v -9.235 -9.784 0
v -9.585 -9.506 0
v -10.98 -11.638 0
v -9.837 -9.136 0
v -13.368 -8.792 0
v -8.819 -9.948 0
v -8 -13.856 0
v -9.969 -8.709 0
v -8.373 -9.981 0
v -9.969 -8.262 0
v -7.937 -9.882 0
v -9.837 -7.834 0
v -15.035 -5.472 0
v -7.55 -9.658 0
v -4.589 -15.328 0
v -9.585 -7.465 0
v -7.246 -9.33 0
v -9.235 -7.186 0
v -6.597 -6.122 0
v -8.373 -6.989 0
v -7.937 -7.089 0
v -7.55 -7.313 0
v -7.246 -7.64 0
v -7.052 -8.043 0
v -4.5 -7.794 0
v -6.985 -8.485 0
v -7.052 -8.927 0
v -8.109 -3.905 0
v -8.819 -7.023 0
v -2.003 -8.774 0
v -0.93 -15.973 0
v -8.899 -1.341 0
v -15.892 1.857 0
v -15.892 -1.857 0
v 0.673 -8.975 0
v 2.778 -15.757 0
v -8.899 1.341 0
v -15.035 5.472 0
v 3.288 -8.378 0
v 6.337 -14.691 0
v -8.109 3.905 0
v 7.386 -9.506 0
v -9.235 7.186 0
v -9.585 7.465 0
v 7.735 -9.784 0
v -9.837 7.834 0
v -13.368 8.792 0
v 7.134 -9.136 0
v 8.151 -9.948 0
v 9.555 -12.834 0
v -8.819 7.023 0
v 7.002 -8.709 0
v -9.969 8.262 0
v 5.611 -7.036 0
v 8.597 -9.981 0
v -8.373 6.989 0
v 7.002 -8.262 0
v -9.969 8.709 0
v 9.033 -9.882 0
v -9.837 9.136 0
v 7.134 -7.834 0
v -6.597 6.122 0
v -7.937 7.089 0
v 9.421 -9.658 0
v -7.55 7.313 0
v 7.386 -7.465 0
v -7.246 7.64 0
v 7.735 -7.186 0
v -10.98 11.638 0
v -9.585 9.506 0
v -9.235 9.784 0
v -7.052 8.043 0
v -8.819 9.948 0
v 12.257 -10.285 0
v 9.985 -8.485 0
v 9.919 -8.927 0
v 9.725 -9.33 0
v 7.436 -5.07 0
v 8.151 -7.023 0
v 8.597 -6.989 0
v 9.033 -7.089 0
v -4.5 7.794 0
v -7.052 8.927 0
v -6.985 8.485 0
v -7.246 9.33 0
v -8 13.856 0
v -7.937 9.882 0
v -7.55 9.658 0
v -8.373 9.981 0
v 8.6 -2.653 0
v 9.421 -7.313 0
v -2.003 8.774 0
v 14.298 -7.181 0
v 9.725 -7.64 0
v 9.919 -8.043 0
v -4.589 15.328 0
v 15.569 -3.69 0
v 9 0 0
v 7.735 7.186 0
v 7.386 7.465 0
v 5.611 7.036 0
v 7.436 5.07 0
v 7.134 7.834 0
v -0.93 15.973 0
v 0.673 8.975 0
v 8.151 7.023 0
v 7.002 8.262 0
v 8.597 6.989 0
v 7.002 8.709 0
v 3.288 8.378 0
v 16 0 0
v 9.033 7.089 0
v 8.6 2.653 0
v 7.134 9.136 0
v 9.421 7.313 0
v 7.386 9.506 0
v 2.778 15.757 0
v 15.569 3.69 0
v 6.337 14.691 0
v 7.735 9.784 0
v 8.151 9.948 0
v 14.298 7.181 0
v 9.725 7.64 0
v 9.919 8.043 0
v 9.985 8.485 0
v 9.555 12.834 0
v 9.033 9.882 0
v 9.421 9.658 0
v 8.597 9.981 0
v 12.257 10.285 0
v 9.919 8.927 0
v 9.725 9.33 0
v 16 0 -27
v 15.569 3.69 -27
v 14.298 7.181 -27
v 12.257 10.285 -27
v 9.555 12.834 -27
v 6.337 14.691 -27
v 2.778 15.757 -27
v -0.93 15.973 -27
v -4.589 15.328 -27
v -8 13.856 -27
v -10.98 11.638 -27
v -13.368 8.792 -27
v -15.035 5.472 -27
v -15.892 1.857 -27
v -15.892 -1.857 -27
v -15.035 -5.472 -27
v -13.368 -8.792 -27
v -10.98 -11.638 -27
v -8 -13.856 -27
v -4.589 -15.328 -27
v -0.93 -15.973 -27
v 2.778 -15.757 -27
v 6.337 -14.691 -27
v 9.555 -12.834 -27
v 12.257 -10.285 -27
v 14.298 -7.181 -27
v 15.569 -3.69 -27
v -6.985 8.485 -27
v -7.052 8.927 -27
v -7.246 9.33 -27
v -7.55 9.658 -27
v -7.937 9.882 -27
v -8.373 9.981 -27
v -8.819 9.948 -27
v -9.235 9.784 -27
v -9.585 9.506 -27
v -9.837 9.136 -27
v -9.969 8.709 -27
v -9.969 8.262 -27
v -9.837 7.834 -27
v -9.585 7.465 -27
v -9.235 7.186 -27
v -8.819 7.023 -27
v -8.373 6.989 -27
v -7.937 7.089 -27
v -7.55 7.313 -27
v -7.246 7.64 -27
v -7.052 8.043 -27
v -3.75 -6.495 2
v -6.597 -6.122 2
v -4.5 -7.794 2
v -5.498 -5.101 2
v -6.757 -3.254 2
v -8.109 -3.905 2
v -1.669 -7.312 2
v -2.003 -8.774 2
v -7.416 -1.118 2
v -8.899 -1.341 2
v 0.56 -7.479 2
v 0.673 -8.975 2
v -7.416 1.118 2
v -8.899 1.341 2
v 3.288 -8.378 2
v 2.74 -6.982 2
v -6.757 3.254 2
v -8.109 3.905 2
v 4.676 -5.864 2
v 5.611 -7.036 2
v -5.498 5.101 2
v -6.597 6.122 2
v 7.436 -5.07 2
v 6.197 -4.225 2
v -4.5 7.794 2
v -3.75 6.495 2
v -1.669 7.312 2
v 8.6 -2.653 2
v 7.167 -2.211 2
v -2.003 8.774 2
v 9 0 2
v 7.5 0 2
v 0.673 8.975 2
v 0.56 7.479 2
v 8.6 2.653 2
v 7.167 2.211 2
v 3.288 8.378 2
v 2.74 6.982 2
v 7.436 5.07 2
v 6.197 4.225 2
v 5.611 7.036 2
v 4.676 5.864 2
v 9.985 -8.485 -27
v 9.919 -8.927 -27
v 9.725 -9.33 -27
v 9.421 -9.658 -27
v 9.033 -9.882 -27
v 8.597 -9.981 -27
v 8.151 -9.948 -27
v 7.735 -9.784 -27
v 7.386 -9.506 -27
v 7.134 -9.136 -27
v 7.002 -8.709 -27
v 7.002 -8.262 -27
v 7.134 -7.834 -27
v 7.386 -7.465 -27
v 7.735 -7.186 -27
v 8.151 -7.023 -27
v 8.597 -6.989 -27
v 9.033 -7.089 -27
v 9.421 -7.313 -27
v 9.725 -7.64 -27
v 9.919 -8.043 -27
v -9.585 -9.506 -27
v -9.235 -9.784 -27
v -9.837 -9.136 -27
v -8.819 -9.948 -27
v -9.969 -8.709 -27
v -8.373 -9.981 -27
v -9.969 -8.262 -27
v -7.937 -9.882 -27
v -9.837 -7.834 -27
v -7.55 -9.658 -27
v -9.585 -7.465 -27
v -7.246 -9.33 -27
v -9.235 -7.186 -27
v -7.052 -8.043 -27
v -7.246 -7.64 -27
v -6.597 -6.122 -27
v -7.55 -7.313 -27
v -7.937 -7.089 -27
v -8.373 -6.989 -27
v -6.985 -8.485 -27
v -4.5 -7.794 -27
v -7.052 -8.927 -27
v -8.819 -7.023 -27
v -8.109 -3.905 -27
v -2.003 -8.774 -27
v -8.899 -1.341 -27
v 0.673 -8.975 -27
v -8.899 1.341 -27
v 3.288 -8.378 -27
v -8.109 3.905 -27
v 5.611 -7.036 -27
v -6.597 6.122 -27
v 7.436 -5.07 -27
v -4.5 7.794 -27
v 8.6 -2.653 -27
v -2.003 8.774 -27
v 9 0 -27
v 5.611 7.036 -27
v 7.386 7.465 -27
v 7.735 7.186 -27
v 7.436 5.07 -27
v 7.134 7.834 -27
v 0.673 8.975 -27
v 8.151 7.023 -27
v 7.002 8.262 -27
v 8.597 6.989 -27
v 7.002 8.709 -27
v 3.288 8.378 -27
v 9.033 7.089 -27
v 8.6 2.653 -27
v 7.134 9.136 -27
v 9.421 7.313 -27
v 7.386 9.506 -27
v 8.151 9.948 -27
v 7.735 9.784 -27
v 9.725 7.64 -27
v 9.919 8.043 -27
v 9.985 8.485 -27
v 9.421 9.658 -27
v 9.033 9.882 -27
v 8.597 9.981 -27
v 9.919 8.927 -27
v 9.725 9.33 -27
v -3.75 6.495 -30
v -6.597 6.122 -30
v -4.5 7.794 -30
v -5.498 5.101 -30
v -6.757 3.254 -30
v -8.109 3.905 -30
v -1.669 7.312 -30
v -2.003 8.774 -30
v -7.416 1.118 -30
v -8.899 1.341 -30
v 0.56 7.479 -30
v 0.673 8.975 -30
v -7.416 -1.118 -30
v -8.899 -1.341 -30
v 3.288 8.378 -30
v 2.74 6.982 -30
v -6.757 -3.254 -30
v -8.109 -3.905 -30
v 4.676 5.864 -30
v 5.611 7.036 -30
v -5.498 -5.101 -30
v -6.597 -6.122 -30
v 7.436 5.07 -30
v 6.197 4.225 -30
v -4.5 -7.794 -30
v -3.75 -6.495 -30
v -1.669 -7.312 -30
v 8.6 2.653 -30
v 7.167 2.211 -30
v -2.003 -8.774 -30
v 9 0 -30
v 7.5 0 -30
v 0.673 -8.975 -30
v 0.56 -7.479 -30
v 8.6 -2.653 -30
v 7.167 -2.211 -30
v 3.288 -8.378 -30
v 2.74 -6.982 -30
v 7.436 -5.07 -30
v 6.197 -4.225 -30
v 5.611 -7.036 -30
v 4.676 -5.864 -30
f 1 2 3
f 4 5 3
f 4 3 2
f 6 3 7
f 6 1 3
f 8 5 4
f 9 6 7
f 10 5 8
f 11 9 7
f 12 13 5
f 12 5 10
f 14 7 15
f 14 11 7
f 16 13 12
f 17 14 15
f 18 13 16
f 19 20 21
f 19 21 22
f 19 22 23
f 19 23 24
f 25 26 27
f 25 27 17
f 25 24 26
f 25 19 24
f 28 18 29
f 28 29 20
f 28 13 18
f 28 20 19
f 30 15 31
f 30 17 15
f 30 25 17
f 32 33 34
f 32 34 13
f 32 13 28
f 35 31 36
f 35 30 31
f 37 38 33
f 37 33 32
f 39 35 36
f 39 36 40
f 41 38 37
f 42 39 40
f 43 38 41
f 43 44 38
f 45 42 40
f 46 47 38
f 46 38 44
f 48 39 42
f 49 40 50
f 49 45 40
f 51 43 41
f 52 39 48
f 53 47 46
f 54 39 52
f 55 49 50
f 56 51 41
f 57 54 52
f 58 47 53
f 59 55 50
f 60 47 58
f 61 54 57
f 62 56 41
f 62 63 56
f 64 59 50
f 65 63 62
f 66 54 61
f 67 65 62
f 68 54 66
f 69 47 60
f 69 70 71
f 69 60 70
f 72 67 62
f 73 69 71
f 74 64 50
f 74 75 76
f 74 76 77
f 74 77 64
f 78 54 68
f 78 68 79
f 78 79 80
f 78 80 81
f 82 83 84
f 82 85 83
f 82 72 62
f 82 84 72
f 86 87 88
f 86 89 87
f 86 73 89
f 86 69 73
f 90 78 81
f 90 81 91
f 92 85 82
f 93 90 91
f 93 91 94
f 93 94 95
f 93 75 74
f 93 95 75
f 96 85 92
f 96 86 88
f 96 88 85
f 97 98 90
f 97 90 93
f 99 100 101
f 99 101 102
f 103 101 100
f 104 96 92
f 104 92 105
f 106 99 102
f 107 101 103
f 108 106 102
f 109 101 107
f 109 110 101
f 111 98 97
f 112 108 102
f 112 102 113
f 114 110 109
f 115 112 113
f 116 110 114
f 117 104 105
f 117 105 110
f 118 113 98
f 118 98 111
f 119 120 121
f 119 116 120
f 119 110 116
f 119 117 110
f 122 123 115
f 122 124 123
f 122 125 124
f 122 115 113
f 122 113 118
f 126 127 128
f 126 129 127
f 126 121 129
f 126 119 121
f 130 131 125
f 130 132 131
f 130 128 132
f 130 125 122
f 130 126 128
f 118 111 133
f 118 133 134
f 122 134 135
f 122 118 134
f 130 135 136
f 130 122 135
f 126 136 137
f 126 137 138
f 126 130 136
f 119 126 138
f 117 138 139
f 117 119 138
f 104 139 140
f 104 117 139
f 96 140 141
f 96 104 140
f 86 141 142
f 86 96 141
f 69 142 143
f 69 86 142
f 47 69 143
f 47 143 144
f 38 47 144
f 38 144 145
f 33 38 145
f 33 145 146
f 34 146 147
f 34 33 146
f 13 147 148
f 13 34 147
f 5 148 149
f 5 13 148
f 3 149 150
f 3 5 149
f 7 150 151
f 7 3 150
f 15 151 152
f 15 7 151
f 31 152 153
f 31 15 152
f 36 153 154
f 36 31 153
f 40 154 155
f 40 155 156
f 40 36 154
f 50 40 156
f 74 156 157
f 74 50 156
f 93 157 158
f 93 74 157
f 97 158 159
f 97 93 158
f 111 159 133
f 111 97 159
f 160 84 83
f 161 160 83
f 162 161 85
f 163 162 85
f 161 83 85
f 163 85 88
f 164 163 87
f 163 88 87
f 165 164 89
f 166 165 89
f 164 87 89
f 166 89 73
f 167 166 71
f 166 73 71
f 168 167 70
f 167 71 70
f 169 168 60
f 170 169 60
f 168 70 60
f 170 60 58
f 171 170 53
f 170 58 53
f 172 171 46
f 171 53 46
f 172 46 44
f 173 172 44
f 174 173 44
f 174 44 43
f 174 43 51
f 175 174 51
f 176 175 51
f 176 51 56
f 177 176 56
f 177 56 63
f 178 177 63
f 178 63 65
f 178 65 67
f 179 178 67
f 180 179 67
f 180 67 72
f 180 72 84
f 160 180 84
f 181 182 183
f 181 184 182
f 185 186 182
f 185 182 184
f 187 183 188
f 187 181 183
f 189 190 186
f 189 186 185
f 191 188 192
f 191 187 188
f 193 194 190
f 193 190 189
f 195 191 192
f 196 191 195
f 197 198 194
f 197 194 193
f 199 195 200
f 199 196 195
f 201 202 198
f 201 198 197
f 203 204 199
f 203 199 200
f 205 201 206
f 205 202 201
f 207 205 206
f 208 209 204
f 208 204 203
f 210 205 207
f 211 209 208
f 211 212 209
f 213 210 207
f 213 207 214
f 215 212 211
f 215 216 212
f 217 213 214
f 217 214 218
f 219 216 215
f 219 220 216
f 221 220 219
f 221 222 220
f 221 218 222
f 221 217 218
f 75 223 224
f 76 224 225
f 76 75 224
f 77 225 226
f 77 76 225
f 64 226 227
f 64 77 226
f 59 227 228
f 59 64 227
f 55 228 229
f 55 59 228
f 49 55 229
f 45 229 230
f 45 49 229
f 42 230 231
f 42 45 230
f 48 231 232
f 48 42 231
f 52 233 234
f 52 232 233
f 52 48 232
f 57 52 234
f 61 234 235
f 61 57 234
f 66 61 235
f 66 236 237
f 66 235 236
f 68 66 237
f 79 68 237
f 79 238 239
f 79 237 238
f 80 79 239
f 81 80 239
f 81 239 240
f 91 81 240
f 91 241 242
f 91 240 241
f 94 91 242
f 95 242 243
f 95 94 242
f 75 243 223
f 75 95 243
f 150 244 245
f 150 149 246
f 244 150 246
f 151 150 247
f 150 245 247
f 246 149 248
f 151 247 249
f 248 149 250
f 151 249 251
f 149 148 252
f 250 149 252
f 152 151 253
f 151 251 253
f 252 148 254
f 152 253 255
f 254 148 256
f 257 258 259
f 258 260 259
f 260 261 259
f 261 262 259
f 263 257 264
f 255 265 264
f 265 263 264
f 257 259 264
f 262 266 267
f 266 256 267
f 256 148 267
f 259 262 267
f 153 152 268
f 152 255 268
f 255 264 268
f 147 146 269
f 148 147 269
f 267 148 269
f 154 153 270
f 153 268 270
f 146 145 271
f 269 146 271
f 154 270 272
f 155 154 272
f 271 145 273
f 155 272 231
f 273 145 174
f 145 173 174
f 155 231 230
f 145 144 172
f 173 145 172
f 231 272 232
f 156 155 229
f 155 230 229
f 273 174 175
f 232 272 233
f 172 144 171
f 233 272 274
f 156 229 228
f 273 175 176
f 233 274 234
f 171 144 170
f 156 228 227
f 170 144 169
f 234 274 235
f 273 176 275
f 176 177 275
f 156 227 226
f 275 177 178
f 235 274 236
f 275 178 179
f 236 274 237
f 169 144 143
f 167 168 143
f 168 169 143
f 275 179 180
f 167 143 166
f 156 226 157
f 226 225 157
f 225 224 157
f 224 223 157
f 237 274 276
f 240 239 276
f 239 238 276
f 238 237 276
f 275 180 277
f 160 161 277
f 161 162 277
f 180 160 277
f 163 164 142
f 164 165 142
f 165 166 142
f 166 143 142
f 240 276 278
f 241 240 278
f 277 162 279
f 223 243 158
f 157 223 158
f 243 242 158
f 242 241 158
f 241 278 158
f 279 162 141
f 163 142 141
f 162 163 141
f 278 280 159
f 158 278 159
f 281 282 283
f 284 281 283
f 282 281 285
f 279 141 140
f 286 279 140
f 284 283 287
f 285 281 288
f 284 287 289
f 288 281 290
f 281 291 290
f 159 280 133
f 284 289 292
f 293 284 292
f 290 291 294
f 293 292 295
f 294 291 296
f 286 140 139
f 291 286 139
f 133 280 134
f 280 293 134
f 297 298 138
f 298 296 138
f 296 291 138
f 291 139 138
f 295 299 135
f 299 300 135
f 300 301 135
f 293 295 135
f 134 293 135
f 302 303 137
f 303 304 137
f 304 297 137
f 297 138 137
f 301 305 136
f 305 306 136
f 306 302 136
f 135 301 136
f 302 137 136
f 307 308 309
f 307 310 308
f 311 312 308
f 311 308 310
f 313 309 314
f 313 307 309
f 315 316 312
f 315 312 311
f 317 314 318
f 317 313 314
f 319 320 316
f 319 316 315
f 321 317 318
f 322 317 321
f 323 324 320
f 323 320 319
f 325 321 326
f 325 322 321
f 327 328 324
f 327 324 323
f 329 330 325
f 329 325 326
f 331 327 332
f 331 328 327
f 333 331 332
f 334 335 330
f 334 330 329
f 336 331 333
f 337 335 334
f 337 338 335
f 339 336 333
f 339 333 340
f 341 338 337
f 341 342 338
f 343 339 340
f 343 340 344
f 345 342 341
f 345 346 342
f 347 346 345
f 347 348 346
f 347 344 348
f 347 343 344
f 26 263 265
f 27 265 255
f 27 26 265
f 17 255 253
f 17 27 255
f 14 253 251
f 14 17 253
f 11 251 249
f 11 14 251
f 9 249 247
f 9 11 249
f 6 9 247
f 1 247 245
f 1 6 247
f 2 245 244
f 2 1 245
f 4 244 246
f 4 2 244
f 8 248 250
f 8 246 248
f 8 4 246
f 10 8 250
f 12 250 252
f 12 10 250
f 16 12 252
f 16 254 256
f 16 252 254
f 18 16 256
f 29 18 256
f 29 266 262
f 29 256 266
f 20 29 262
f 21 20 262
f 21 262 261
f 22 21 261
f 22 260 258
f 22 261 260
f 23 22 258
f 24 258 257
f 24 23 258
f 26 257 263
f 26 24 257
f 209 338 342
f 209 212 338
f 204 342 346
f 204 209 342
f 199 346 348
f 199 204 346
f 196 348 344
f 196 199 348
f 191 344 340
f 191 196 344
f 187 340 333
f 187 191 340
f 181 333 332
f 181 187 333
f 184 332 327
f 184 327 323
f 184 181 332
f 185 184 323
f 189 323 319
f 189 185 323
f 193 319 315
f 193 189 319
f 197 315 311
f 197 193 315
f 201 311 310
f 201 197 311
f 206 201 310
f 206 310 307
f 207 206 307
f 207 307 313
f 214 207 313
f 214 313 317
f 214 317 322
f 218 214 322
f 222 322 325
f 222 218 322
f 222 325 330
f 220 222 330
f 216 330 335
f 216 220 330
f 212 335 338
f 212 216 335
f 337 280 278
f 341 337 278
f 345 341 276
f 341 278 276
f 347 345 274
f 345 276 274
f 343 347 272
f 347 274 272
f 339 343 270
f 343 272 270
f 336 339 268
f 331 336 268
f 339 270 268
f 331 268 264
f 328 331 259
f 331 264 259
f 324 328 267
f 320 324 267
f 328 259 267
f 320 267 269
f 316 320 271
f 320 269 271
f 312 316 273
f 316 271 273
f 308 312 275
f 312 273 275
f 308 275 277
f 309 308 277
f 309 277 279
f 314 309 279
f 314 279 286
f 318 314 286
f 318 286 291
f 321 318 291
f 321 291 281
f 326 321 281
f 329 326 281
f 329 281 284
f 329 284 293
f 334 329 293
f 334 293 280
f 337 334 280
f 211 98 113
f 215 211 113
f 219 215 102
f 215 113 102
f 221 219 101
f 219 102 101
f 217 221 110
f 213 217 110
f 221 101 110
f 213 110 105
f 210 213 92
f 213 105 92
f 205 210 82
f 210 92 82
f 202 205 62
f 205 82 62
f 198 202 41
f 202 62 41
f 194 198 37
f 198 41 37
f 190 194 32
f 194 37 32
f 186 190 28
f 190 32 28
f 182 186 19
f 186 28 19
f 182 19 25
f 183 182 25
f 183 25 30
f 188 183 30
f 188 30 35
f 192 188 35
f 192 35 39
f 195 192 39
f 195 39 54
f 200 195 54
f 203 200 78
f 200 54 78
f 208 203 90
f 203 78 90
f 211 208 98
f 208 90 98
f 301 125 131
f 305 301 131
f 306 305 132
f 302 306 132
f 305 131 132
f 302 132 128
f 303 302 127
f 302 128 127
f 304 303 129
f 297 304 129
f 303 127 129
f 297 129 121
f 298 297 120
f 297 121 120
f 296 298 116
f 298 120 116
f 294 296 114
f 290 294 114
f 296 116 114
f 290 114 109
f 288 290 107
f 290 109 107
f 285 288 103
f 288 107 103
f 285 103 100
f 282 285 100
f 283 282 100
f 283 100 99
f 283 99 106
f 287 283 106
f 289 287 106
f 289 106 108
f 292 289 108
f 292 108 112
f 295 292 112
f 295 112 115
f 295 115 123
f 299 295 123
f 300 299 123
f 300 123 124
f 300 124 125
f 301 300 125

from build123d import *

# Parameters (mm, degrees)
ESQUISSE3_R             = 16
ESQUISSE3_R_2           = 9
BOSS_EXTRU_1_DEPTH      = 27
ESQUISSE3_3_R           = 9
ESQUISSE3_3_R_2         = 7.5
BOSS_EXTRU_2_DEPTH      = 2
ESQUISSE7_R             = 9
ESQUISSE7_R_2           = 7.5
BOSS_EXTRU_3_DEPTH      = 30
ESQUISSE8_R             = 1.5
ENL_V_MAT_EXTRU_1_DEPTH = 30


with BuildPart() as part:
    # Esquisse3 → Boss.-Extru.1 (new body)
    with BuildSketch(Plane.XY):
        Circle(ESQUISSE3_R)
        Circle(ESQUISSE3_R_2, mode=Mode.SUBTRACT)
    extrude(amount=-BOSS_EXTRU_1_DEPTH)



with BuildPart() as body_2:
    # Esquisse3<3> → Boss.-Extru.2 (new body)
    with BuildSketch(Plane.XY):
        Circle(ESQUISSE3_3_R)
        Circle(ESQUISSE3_3_R_2, mode=Mode.SUBTRACT)
    extrude(amount=BOSS_EXTRU_2_DEPTH)


with BuildPart() as part_1:
    add(part.part)

    add(body_2.part)  # Boss.-Extru.3 merges body 2
    # Esquisse7 → Boss.-Extru.3 (add)
    with BuildSketch(Plane(origin=(0, 0, 0), x_dir=(-1, 0, 0), z_dir=(0, 0, -1))):
        Circle(ESQUISSE7_R)
        Circle(ESQUISSE7_R_2, mode=Mode.SUBTRACT)
    extrude(amount=BOSS_EXTRU_3_DEPTH)

    # Esquisse8 → Enlèv. mat.-Extru.1 (cut)
    with BuildSketch(Plane.XY):
        with Locations((-8.485281374, 8.485281374)):
            Circle(ESQUISSE8_R)
        with Locations((8.485281374, 8.485281374)):
            Circle(ESQUISSE8_R)
    enl_v_mat_extru_1 = extrude(amount=-ENL_V_MAT_EXTRU_1_DEPTH, mode=Mode.SUBTRACT)

    # Symétrie1: Enlèv. mat.-Extru.1 across plane
    add(enl_v_mat_extru_1.mirror(Plane.ZX), mode=Mode.SUBTRACT)


solid = part_1.part
